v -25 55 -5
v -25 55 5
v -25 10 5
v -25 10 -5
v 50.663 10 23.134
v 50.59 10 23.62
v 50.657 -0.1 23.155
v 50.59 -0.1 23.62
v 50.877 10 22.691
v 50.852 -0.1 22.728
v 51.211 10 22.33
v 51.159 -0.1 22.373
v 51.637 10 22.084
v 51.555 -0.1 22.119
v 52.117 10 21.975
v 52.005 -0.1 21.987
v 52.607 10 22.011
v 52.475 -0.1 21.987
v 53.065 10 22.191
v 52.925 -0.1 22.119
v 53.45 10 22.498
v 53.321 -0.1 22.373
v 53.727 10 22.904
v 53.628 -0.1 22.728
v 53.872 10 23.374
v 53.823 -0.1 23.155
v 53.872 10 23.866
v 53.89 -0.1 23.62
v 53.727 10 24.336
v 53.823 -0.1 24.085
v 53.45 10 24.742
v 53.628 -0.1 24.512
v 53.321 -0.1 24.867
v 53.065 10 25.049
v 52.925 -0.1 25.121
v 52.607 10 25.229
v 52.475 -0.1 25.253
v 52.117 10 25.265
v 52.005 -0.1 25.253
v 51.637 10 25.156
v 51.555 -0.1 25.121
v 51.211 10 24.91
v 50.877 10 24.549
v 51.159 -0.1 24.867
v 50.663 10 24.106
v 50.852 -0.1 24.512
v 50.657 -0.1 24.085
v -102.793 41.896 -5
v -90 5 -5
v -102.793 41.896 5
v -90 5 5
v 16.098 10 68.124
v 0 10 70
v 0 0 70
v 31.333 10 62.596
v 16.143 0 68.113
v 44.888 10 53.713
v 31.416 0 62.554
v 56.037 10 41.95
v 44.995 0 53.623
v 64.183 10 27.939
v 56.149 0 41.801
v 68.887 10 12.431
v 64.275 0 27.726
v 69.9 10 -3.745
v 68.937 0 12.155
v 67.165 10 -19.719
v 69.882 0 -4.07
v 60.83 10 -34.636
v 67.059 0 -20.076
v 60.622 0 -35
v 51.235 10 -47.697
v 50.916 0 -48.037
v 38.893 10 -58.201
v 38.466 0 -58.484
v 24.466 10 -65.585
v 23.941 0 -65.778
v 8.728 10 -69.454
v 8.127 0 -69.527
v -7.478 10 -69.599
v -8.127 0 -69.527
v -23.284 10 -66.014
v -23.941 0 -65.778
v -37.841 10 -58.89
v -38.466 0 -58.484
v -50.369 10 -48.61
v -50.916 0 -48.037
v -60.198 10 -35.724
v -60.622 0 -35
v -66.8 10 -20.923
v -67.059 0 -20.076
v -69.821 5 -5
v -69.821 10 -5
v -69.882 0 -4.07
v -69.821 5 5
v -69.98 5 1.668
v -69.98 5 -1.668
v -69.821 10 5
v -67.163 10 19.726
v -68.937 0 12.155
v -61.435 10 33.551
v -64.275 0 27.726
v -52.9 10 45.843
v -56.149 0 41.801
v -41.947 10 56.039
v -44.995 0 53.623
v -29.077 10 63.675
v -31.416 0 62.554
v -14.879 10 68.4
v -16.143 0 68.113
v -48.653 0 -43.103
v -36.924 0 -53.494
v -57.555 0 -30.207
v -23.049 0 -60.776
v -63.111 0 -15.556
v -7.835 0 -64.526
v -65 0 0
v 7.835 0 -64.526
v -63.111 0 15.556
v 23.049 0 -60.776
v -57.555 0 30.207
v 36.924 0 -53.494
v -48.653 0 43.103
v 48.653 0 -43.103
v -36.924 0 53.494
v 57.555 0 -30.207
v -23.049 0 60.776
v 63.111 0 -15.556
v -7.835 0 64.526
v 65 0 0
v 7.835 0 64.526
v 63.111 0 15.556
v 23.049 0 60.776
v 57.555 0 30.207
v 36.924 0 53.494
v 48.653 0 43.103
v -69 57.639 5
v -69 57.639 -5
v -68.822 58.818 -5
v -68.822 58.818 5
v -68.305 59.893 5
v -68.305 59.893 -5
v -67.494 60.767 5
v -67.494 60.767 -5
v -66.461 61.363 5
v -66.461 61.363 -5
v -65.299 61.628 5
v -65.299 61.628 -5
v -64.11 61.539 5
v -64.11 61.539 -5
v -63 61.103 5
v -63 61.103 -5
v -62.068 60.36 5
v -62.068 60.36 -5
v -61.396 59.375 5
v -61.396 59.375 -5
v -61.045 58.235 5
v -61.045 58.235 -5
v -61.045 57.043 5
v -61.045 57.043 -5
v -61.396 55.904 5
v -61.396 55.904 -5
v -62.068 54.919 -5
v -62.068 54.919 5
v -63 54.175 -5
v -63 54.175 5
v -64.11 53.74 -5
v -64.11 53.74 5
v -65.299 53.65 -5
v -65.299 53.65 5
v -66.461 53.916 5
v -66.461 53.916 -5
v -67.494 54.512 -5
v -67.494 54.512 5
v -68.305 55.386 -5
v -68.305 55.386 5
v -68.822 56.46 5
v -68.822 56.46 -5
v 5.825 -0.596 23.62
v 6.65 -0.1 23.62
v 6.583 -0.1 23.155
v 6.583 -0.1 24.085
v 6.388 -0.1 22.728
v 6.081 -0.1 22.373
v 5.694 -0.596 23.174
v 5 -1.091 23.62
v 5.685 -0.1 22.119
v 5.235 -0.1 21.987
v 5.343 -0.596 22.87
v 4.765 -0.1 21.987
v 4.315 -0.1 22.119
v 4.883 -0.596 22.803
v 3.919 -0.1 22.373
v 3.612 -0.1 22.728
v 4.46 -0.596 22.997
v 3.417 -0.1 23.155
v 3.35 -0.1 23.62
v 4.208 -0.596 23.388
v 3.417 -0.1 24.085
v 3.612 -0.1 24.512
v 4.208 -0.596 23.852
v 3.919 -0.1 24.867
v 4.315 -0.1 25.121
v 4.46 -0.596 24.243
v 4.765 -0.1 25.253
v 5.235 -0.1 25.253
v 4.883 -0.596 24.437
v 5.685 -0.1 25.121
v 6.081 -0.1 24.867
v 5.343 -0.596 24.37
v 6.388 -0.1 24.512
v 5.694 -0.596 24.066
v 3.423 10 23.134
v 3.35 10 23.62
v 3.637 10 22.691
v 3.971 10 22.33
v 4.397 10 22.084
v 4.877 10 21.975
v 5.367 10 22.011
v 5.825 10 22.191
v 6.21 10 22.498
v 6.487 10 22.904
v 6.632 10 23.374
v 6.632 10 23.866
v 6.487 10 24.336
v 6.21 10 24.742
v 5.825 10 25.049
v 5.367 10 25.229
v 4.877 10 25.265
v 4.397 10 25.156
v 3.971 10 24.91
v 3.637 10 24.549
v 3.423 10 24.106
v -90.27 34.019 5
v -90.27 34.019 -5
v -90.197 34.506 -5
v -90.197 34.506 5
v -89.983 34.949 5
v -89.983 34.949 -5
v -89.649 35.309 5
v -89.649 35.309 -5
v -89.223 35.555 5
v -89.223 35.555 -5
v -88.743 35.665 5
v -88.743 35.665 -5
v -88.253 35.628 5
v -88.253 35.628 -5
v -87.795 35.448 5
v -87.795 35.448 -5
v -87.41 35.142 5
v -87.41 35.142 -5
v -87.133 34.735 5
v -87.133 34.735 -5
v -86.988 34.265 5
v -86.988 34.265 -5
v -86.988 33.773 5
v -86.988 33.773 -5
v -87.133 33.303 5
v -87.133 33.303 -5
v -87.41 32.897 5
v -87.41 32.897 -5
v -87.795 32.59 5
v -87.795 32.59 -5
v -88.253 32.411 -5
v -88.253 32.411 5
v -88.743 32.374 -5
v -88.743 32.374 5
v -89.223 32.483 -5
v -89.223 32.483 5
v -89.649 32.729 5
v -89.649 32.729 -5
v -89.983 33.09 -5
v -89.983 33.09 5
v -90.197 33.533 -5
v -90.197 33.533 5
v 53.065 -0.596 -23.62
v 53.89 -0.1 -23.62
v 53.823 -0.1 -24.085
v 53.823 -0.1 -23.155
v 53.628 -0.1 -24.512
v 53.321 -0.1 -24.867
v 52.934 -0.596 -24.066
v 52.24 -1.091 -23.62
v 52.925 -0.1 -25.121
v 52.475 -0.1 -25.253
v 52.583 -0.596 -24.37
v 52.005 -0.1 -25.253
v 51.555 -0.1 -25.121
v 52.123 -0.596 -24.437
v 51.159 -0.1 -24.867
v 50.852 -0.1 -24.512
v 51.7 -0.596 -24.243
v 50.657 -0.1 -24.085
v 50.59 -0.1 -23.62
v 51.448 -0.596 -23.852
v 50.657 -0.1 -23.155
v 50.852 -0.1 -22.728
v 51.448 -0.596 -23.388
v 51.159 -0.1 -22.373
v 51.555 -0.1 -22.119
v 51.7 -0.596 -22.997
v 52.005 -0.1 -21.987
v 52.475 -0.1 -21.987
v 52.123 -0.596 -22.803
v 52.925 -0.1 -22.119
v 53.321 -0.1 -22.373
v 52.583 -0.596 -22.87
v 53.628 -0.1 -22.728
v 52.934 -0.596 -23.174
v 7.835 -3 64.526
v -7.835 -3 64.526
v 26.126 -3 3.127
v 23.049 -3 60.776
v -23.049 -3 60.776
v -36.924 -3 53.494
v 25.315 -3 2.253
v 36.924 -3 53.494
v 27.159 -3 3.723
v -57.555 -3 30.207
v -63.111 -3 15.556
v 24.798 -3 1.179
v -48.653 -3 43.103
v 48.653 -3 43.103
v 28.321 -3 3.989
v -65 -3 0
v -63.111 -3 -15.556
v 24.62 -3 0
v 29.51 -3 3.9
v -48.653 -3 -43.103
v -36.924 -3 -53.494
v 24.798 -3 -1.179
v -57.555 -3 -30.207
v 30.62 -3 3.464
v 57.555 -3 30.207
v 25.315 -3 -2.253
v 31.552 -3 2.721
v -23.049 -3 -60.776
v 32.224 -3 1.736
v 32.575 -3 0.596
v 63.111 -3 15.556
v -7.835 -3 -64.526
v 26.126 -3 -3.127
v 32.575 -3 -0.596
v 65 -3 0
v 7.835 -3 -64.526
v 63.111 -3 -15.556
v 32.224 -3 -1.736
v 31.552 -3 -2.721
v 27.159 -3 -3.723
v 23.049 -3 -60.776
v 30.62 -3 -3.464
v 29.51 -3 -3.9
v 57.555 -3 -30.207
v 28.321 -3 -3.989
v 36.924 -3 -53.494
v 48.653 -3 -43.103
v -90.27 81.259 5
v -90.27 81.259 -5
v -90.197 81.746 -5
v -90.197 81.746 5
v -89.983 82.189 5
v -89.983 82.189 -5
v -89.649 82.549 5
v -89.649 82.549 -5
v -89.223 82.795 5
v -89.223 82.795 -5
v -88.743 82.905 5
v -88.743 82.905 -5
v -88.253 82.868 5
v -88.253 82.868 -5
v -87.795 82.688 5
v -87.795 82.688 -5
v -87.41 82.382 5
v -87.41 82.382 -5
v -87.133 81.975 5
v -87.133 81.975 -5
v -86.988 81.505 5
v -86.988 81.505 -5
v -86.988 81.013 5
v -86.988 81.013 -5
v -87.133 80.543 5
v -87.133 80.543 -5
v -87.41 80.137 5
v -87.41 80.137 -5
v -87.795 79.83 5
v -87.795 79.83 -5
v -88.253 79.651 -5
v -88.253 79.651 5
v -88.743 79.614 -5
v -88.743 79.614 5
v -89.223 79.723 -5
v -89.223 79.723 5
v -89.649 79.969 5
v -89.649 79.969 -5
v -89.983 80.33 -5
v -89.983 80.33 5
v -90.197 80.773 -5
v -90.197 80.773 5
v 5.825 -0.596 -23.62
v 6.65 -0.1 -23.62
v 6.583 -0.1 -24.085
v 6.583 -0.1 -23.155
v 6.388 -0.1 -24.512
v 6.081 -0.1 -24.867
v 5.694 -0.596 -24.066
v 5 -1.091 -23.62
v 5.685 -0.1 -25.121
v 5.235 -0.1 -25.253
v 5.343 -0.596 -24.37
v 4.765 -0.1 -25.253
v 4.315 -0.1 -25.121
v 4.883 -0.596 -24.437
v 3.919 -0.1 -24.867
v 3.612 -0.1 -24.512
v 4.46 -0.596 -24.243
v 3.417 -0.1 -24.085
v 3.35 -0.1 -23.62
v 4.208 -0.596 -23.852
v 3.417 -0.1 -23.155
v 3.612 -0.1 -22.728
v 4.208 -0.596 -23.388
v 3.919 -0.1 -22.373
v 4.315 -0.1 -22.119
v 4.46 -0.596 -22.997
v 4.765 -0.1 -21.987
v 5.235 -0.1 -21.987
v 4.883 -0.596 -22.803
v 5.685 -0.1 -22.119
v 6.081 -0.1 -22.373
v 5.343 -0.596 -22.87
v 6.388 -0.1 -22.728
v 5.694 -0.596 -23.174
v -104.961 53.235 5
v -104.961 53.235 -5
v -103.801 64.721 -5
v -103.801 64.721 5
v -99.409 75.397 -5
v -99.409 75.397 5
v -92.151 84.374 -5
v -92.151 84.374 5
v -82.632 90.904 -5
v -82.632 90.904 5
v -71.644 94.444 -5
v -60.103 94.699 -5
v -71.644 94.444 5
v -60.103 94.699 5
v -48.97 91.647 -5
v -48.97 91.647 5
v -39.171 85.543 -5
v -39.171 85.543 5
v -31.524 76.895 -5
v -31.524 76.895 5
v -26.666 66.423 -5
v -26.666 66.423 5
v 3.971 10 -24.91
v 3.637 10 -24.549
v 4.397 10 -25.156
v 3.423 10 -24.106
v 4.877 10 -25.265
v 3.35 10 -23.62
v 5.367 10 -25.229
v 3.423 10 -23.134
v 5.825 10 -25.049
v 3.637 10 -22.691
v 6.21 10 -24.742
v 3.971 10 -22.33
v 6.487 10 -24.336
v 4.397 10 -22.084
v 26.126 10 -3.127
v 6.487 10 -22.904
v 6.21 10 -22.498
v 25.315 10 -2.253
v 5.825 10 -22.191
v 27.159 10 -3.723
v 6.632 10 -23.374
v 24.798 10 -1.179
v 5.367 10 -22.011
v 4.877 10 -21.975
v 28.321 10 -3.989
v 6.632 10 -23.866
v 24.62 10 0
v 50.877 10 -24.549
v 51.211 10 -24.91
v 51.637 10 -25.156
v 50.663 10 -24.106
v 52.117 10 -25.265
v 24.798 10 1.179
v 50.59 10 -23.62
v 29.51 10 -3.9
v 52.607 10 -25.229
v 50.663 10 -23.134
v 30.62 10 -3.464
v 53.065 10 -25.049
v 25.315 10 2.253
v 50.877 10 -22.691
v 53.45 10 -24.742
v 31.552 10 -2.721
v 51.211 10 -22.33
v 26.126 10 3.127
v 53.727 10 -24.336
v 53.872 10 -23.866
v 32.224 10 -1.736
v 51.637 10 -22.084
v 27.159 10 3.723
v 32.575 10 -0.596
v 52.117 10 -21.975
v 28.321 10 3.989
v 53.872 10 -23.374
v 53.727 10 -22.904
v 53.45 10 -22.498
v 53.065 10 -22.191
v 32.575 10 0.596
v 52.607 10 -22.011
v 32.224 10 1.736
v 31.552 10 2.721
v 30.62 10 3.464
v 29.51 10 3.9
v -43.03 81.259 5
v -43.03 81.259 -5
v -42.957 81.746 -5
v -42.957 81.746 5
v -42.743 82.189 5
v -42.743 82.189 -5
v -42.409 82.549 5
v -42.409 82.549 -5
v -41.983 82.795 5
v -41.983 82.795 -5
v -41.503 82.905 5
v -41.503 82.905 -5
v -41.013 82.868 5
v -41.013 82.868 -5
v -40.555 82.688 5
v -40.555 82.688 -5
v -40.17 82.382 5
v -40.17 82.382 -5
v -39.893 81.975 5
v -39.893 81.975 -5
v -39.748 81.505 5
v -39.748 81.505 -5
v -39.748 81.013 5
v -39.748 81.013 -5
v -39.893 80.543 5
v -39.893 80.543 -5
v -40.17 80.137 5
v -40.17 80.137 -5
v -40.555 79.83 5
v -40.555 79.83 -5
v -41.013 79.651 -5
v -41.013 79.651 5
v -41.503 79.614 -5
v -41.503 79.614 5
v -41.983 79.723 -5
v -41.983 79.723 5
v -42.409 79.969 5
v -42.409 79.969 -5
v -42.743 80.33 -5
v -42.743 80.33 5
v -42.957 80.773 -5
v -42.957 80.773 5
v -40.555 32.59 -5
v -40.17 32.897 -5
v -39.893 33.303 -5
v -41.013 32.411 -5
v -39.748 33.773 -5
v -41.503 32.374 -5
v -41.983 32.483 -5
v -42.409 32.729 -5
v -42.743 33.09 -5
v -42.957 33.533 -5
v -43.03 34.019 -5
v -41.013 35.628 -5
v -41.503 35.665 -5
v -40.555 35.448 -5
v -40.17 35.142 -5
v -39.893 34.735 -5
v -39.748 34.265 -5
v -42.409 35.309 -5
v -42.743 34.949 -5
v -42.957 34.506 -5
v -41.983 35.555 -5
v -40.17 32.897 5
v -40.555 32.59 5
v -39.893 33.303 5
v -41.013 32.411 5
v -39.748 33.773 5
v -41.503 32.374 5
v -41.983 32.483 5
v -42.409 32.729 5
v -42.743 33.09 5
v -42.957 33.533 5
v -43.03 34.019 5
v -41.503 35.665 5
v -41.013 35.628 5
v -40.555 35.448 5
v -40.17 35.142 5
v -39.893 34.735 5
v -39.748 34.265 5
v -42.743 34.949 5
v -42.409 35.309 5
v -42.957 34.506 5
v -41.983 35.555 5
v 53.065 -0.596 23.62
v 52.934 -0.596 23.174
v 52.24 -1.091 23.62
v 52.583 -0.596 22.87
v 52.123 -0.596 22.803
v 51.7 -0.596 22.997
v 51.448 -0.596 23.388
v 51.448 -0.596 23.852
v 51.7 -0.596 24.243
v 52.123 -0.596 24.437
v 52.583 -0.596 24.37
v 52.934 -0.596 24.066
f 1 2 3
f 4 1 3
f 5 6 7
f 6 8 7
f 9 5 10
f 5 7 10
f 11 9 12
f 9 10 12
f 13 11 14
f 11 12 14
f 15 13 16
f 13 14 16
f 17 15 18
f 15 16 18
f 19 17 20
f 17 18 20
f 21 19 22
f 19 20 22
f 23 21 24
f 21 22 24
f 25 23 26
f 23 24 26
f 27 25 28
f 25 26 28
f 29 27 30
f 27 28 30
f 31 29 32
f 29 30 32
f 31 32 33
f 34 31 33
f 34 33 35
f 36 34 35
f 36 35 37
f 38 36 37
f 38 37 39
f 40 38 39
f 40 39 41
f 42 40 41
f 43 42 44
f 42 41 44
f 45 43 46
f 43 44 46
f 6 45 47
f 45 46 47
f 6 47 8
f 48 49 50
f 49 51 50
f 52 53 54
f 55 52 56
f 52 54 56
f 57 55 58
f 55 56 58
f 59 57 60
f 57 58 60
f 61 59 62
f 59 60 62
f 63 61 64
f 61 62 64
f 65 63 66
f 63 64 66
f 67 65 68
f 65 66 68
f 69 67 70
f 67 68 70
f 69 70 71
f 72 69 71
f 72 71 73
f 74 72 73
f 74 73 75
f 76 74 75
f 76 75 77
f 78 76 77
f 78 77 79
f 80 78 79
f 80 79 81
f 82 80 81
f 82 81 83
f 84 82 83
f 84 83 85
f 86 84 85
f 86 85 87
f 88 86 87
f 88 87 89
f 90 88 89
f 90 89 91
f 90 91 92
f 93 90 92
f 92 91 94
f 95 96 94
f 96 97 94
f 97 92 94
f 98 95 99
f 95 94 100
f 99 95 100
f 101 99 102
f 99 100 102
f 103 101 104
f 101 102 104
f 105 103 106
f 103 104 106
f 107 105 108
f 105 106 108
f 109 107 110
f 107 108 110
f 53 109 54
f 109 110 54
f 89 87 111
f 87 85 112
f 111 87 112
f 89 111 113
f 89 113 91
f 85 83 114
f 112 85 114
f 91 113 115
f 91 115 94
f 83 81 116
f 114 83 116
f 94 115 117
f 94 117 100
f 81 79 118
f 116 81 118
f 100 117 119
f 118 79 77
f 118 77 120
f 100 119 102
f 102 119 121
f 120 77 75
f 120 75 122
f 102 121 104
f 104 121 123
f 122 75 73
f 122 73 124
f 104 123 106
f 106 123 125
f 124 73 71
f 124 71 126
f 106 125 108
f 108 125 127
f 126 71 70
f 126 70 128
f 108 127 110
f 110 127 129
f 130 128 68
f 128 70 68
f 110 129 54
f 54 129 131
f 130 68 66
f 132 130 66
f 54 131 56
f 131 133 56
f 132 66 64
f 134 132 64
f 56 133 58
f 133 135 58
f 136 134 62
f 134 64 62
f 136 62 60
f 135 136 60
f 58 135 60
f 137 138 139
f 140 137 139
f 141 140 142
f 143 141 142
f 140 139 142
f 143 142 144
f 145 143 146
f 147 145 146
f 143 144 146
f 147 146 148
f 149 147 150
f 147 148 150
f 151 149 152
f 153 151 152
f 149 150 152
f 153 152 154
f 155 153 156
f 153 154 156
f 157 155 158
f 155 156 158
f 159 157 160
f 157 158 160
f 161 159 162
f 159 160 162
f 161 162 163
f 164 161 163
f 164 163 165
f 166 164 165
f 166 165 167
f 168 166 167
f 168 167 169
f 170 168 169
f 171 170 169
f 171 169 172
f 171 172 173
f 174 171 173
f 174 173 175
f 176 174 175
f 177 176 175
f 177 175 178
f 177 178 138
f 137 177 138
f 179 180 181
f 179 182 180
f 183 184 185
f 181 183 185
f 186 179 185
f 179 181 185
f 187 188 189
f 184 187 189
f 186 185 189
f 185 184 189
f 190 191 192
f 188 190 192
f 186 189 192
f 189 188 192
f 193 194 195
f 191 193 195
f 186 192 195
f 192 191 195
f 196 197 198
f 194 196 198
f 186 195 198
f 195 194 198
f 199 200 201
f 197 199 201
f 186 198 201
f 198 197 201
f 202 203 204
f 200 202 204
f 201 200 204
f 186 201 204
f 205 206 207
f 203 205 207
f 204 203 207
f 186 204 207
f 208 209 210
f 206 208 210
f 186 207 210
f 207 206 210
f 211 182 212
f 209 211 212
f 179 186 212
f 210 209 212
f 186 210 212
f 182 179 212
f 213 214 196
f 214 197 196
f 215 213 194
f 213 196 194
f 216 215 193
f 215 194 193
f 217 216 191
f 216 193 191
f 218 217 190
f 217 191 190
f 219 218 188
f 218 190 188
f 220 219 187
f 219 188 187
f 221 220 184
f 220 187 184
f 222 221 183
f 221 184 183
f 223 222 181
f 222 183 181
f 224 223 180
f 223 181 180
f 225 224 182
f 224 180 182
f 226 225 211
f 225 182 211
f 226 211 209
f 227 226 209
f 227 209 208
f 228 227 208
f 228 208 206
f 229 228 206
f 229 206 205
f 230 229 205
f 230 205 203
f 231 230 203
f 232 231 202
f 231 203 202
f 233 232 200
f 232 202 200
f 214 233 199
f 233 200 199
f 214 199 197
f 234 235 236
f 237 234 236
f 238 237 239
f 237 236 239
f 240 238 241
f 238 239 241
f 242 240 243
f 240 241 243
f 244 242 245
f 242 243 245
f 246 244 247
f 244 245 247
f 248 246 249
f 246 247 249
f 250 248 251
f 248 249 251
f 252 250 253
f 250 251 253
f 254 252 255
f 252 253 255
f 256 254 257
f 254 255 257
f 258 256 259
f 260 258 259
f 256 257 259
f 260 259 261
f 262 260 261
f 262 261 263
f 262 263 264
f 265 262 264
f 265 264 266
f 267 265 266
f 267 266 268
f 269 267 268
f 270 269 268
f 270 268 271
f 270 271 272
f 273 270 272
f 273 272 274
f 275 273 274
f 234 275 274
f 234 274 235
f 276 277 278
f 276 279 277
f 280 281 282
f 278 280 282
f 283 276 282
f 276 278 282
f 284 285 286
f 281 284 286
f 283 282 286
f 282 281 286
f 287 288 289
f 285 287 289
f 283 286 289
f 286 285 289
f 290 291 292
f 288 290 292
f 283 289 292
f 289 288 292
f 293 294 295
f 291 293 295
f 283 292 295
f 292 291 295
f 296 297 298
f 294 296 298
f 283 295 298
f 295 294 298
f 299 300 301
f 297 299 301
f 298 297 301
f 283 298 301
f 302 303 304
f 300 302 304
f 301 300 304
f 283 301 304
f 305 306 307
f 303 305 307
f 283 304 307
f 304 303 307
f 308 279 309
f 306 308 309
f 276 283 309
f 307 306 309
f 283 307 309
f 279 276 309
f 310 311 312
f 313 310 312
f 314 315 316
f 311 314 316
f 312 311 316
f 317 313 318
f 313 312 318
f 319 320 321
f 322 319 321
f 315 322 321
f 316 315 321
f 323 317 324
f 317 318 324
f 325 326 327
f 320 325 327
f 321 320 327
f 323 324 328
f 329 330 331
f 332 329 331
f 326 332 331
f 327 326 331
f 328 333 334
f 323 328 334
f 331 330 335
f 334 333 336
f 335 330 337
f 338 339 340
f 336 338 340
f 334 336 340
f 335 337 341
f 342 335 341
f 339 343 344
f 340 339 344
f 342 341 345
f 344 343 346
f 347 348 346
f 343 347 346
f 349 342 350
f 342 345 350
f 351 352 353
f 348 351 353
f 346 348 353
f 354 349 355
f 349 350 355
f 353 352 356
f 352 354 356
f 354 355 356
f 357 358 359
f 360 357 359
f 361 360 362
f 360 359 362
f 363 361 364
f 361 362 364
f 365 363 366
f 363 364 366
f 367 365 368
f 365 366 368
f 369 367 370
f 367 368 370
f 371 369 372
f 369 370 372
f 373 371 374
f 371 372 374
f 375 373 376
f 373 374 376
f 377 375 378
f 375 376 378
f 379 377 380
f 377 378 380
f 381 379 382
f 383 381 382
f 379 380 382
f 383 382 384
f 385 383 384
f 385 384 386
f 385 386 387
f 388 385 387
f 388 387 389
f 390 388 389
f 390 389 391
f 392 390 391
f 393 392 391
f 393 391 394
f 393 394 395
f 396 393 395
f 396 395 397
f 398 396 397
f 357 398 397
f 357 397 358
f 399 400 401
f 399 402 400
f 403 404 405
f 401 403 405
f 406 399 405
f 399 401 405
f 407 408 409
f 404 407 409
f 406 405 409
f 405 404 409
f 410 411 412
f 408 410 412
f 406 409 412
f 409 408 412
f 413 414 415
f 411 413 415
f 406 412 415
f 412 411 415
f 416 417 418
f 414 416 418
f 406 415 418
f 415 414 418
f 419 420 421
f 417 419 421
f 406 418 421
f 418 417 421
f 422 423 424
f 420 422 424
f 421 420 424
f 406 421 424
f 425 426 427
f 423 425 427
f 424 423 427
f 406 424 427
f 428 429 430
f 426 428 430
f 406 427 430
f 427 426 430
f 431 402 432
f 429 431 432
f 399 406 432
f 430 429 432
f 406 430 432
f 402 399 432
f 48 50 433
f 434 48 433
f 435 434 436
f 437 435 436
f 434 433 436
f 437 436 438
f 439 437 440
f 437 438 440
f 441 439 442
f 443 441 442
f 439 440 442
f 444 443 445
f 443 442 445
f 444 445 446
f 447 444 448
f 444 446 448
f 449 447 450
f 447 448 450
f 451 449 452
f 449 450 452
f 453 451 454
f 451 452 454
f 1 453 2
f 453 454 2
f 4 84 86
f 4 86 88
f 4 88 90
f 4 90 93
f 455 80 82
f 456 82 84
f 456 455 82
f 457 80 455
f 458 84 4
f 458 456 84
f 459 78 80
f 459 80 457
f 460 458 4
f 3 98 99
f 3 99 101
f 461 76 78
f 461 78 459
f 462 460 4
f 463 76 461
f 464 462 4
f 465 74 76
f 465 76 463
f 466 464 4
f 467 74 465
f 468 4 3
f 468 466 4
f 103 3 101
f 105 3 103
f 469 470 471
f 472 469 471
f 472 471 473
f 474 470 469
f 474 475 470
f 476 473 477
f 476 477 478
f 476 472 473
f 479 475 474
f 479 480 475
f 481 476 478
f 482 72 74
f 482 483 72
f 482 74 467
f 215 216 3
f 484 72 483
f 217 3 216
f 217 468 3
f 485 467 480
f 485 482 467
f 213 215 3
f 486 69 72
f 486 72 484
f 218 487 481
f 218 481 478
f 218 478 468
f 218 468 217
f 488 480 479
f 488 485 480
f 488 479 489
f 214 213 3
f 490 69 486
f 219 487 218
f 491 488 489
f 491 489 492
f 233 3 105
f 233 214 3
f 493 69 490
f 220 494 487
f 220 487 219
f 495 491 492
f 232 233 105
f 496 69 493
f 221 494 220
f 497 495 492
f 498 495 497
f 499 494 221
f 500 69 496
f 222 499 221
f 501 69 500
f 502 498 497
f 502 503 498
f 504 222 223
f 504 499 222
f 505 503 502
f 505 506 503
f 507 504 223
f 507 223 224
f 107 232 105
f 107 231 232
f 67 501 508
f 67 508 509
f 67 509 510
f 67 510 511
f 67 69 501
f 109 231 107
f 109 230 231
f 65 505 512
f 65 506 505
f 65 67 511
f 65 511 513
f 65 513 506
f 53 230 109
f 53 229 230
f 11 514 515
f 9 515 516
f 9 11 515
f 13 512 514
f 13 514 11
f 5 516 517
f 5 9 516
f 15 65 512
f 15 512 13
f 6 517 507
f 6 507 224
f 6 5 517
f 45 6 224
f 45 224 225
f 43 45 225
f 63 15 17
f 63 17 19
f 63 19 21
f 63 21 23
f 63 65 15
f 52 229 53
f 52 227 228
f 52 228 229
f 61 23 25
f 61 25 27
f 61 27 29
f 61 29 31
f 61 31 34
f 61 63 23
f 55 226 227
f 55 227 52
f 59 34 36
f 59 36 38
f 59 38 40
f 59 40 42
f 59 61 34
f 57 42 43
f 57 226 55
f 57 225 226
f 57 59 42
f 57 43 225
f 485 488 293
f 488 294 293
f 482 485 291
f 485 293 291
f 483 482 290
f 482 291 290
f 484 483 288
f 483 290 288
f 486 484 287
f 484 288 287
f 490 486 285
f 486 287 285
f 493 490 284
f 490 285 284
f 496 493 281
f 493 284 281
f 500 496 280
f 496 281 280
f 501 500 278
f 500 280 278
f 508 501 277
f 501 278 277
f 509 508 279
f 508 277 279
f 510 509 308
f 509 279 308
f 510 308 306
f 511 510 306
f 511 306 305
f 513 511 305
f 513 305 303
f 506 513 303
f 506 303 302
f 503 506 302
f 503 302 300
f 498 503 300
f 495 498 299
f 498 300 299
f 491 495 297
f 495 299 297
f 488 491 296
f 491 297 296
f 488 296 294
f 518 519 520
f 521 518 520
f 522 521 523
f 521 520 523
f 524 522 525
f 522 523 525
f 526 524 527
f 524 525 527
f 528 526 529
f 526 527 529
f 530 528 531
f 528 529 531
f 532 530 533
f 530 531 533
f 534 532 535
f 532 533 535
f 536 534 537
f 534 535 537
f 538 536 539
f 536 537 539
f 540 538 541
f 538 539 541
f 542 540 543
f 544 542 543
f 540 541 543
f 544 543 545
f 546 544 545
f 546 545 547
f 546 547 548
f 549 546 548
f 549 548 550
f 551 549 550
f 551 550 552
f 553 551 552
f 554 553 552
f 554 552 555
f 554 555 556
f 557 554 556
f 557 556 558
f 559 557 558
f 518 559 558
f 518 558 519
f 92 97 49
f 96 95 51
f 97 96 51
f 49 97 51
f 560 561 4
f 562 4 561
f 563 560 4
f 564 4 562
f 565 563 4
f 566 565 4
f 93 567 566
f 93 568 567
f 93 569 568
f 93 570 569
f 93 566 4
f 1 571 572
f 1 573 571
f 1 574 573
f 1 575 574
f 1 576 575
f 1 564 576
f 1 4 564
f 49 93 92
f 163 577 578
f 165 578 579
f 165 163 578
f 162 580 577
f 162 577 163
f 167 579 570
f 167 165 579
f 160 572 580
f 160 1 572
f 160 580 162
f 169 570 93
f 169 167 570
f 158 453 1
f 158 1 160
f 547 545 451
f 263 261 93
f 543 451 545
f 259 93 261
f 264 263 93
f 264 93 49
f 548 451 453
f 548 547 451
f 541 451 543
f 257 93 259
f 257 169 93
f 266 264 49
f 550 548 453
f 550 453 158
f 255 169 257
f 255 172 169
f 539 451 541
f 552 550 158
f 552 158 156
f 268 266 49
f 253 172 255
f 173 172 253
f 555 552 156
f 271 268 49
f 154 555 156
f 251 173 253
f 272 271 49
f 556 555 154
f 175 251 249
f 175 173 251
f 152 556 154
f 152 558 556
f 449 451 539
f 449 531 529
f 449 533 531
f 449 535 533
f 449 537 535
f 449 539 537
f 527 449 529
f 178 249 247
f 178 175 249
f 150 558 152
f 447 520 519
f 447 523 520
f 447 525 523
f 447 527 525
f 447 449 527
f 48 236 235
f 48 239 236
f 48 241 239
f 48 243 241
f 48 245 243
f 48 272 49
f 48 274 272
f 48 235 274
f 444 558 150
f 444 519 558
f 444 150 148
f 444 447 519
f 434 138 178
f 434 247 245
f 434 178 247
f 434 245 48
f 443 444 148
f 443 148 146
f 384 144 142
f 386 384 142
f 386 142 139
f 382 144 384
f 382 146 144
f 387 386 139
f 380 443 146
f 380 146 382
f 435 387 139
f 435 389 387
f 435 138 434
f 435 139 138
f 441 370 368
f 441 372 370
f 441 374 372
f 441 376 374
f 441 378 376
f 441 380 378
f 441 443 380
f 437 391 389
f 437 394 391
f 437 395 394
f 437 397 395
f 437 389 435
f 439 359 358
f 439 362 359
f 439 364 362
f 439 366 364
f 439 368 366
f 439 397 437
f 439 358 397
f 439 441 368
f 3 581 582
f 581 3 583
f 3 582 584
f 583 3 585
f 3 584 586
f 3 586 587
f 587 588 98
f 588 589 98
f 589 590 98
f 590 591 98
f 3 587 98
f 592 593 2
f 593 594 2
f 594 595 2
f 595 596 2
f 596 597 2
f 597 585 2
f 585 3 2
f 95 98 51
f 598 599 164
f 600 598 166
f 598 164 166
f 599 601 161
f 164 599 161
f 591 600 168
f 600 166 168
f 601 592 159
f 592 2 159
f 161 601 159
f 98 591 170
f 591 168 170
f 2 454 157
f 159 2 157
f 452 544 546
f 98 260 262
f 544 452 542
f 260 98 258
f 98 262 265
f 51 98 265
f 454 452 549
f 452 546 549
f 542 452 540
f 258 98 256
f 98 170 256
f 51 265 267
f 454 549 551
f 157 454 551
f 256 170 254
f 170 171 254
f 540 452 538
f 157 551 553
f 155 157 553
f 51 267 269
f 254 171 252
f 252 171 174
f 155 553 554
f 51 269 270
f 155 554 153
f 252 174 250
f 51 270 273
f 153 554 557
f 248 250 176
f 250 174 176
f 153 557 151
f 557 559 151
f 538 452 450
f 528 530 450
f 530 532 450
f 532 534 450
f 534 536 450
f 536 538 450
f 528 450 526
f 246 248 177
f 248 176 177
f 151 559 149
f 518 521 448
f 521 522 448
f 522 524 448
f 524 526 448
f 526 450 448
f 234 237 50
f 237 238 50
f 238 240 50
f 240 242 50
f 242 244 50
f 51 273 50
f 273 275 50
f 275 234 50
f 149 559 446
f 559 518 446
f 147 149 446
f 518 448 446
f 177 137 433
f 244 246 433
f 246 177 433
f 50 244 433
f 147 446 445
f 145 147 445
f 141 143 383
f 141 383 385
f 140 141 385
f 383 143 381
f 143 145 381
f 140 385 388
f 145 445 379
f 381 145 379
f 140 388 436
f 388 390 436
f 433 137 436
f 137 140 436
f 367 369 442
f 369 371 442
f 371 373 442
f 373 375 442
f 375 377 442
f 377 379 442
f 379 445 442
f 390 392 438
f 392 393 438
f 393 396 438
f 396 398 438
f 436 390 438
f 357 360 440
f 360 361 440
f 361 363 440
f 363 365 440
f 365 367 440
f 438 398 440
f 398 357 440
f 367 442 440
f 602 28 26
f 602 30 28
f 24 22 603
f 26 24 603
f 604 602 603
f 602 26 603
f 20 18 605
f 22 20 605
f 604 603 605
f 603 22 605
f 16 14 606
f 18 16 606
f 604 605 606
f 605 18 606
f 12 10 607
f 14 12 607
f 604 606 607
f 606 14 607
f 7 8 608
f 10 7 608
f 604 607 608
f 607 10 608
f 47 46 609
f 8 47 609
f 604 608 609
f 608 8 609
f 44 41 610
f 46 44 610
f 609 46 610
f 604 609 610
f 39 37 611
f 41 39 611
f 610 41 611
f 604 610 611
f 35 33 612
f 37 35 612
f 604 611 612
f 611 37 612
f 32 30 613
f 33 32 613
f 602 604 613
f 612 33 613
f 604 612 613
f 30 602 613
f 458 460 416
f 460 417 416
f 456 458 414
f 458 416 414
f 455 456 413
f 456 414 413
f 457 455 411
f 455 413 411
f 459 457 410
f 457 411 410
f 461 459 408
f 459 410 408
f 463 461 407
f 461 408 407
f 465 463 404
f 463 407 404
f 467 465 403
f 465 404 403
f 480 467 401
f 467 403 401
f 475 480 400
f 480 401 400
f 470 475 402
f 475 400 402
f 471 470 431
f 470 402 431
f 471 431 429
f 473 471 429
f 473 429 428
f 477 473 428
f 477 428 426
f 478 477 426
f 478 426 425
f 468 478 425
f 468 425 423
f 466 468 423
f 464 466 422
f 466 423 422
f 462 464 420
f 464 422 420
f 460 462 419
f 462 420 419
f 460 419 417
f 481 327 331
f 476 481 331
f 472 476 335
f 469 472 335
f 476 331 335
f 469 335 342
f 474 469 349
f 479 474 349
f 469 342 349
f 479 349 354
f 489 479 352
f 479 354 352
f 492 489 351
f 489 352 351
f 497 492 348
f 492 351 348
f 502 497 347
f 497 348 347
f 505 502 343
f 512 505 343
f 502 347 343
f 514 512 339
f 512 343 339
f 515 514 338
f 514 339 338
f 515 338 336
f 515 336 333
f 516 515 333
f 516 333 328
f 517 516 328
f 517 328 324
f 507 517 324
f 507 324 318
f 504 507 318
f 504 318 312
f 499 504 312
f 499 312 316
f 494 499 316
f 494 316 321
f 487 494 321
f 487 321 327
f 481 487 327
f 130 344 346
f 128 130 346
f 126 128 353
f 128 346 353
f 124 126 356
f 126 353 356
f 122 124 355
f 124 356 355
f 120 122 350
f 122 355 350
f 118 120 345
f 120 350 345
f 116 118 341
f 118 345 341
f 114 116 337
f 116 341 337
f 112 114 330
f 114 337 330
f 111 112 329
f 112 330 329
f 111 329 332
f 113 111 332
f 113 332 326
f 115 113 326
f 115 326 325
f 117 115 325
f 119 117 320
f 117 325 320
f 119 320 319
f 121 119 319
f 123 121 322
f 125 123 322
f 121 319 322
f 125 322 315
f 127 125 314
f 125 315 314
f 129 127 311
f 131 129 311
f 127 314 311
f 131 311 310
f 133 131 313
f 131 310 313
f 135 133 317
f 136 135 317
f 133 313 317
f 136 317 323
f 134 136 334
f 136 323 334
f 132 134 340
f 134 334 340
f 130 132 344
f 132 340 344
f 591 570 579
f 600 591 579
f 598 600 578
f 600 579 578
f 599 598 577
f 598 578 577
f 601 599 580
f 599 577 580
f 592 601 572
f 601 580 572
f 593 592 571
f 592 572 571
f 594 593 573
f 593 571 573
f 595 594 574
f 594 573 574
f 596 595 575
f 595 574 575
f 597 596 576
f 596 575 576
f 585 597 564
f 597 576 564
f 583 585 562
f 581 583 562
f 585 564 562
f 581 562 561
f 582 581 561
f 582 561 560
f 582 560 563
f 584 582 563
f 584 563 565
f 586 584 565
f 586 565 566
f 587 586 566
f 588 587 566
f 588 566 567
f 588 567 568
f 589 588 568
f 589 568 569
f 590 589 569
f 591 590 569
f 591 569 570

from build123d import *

# Parameters (mm, degrees)
SKETCH1_R                 = 70
BOSS_EXTRUDE1_DEPTH       = 10
BOSS_EXTRUDE2_START       = -3
BOSS_EXTRUDE2_OUTLINE_R   = 65
BOSS_EXTRUDE2_DEPTH       = 3
BOSS_EXTRUDE3_DEPTH       = 5
M4X0_7_TAPPED_HOLE1_D     = 3.3
M4X0_7_TAPPED_HOLE1_DEPTH = 10.1
M4X0_7_TAPPED_HOLE1_TIP   = 0.991420021
F_8_0MM_DOWEL_HOLE1_D     = 8
F_8_0MM_DOWEL_HOLE2_D     = 8
M4X0_7_TAPPED_HOLE2_D     = 3.3
M4X0_7_TAPPED_HOLE2_DEPTH = 10.1
M4X0_7_TAPPED_HOLE2_TIP   = 0.991420021


# Read off the part's stored shape, not the designer's step: Boss-Extrude2
with BuildPart() as part:
    # Sketch1 → Boss-Extrude1 (new body)
    with BuildSketch(Plane(origin=(0, 0, 0), x_dir=(1, 0, 0), z_dir=(0, 1, 0))):
        with Locations(Location((0, 0, 0), (0, 0, 270))):
            Circle(SKETCH1_R)
    extrude(amount=BOSS_EXTRUDE1_DEPTH)

    # Boss-Extrude2 outline → Boss-Extrude2 (add)
    with BuildSketch(Plane(origin=(0, 0, 0), x_dir=(1, 0, 0), z_dir=(0, 1, 0)).offset(BOSS_EXTRUDE2_START)):
        Circle(BOSS_EXTRUDE2_OUTLINE_R)
    extrude(amount=BOSS_EXTRUDE2_DEPTH)

    # Sketch3 → Boss-Extrude3 (add, symmetric)
    with BuildSketch(Plane.XY):
        with BuildLine():
            Line((-25, 55), (-25, 5))
            Line((-25, 5), (-90, 5))
            Line((-90, 5), (-102.792798963, 41.896399481))
            ThreePointArc((-102.792798963, 41.896399481), (-71.644096684, 94.444340269), (-25, 55))
        make_face()
    extrude(amount=BOSS_EXTRUDE3_DEPTH, both=True)

    # M4x0.7 Tapped Hole1
    with Locations(Plane(origin=(0, 10, 0), x_dir=(1, 0, 0), z_dir=(0, 1, 0))):
        with Locations((5, 23.62), (52.24, 23.62), (52.24, -23.62), (5, -23.62)):
            Hole(M4X0_7_TAPPED_HOLE1_D / 2, depth=M4X0_7_TAPPED_HOLE1_DEPTH)
            with Locations((0, 0, -(M4X0_7_TAPPED_HOLE1_DEPTH + M4X0_7_TAPPED_HOLE1_TIP / 2))):  # 118° drill point
                Cone(0, M4X0_7_TAPPED_HOLE1_D / 2, M4X0_7_TAPPED_HOLE1_TIP, mode=Mode.SUBTRACT)

    # Ø8.0mm Dowel Hole1 (through all)
    with Locations(Plane(origin=(0, 10, 0), x_dir=(1, 0, 0), z_dir=(0, 1, 0))):
        with Locations((28.62, 0)):
            Hole(F_8_0MM_DOWEL_HOLE1_D / 2)

    # Ø8.0mm Dowel Hole2 (through all)
    with Locations(Plane.XY.offset(5)):
        with Locations((-65, 57.639293091)):
            Hole(F_8_0MM_DOWEL_HOLE2_D / 2)

    # M4x0.7 Tapped Hole2
    with Locations(Plane(origin=(-106.523745818, 66.238796536, 5), x_dir=(1, 0, 0), z_dir=(0, 0, 1))):
        with Locations((17.903745818, 15.020496555), (65.143745818, 15.020496555), (65.143745818, -32.219503445), (17.903745818, -32.219503445)):
            Hole(M4X0_7_TAPPED_HOLE2_D / 2, depth=M4X0_7_TAPPED_HOLE2_DEPTH)
            with Locations((0, 0, -(M4X0_7_TAPPED_HOLE2_DEPTH + M4X0_7_TAPPED_HOLE2_TIP / 2))):  # 118° drill point
                Cone(0, M4X0_7_TAPPED_HOLE2_D / 2, M4X0_7_TAPPED_HOLE2_TIP, mode=Mode.SUBTRACT)


solid = part.part
